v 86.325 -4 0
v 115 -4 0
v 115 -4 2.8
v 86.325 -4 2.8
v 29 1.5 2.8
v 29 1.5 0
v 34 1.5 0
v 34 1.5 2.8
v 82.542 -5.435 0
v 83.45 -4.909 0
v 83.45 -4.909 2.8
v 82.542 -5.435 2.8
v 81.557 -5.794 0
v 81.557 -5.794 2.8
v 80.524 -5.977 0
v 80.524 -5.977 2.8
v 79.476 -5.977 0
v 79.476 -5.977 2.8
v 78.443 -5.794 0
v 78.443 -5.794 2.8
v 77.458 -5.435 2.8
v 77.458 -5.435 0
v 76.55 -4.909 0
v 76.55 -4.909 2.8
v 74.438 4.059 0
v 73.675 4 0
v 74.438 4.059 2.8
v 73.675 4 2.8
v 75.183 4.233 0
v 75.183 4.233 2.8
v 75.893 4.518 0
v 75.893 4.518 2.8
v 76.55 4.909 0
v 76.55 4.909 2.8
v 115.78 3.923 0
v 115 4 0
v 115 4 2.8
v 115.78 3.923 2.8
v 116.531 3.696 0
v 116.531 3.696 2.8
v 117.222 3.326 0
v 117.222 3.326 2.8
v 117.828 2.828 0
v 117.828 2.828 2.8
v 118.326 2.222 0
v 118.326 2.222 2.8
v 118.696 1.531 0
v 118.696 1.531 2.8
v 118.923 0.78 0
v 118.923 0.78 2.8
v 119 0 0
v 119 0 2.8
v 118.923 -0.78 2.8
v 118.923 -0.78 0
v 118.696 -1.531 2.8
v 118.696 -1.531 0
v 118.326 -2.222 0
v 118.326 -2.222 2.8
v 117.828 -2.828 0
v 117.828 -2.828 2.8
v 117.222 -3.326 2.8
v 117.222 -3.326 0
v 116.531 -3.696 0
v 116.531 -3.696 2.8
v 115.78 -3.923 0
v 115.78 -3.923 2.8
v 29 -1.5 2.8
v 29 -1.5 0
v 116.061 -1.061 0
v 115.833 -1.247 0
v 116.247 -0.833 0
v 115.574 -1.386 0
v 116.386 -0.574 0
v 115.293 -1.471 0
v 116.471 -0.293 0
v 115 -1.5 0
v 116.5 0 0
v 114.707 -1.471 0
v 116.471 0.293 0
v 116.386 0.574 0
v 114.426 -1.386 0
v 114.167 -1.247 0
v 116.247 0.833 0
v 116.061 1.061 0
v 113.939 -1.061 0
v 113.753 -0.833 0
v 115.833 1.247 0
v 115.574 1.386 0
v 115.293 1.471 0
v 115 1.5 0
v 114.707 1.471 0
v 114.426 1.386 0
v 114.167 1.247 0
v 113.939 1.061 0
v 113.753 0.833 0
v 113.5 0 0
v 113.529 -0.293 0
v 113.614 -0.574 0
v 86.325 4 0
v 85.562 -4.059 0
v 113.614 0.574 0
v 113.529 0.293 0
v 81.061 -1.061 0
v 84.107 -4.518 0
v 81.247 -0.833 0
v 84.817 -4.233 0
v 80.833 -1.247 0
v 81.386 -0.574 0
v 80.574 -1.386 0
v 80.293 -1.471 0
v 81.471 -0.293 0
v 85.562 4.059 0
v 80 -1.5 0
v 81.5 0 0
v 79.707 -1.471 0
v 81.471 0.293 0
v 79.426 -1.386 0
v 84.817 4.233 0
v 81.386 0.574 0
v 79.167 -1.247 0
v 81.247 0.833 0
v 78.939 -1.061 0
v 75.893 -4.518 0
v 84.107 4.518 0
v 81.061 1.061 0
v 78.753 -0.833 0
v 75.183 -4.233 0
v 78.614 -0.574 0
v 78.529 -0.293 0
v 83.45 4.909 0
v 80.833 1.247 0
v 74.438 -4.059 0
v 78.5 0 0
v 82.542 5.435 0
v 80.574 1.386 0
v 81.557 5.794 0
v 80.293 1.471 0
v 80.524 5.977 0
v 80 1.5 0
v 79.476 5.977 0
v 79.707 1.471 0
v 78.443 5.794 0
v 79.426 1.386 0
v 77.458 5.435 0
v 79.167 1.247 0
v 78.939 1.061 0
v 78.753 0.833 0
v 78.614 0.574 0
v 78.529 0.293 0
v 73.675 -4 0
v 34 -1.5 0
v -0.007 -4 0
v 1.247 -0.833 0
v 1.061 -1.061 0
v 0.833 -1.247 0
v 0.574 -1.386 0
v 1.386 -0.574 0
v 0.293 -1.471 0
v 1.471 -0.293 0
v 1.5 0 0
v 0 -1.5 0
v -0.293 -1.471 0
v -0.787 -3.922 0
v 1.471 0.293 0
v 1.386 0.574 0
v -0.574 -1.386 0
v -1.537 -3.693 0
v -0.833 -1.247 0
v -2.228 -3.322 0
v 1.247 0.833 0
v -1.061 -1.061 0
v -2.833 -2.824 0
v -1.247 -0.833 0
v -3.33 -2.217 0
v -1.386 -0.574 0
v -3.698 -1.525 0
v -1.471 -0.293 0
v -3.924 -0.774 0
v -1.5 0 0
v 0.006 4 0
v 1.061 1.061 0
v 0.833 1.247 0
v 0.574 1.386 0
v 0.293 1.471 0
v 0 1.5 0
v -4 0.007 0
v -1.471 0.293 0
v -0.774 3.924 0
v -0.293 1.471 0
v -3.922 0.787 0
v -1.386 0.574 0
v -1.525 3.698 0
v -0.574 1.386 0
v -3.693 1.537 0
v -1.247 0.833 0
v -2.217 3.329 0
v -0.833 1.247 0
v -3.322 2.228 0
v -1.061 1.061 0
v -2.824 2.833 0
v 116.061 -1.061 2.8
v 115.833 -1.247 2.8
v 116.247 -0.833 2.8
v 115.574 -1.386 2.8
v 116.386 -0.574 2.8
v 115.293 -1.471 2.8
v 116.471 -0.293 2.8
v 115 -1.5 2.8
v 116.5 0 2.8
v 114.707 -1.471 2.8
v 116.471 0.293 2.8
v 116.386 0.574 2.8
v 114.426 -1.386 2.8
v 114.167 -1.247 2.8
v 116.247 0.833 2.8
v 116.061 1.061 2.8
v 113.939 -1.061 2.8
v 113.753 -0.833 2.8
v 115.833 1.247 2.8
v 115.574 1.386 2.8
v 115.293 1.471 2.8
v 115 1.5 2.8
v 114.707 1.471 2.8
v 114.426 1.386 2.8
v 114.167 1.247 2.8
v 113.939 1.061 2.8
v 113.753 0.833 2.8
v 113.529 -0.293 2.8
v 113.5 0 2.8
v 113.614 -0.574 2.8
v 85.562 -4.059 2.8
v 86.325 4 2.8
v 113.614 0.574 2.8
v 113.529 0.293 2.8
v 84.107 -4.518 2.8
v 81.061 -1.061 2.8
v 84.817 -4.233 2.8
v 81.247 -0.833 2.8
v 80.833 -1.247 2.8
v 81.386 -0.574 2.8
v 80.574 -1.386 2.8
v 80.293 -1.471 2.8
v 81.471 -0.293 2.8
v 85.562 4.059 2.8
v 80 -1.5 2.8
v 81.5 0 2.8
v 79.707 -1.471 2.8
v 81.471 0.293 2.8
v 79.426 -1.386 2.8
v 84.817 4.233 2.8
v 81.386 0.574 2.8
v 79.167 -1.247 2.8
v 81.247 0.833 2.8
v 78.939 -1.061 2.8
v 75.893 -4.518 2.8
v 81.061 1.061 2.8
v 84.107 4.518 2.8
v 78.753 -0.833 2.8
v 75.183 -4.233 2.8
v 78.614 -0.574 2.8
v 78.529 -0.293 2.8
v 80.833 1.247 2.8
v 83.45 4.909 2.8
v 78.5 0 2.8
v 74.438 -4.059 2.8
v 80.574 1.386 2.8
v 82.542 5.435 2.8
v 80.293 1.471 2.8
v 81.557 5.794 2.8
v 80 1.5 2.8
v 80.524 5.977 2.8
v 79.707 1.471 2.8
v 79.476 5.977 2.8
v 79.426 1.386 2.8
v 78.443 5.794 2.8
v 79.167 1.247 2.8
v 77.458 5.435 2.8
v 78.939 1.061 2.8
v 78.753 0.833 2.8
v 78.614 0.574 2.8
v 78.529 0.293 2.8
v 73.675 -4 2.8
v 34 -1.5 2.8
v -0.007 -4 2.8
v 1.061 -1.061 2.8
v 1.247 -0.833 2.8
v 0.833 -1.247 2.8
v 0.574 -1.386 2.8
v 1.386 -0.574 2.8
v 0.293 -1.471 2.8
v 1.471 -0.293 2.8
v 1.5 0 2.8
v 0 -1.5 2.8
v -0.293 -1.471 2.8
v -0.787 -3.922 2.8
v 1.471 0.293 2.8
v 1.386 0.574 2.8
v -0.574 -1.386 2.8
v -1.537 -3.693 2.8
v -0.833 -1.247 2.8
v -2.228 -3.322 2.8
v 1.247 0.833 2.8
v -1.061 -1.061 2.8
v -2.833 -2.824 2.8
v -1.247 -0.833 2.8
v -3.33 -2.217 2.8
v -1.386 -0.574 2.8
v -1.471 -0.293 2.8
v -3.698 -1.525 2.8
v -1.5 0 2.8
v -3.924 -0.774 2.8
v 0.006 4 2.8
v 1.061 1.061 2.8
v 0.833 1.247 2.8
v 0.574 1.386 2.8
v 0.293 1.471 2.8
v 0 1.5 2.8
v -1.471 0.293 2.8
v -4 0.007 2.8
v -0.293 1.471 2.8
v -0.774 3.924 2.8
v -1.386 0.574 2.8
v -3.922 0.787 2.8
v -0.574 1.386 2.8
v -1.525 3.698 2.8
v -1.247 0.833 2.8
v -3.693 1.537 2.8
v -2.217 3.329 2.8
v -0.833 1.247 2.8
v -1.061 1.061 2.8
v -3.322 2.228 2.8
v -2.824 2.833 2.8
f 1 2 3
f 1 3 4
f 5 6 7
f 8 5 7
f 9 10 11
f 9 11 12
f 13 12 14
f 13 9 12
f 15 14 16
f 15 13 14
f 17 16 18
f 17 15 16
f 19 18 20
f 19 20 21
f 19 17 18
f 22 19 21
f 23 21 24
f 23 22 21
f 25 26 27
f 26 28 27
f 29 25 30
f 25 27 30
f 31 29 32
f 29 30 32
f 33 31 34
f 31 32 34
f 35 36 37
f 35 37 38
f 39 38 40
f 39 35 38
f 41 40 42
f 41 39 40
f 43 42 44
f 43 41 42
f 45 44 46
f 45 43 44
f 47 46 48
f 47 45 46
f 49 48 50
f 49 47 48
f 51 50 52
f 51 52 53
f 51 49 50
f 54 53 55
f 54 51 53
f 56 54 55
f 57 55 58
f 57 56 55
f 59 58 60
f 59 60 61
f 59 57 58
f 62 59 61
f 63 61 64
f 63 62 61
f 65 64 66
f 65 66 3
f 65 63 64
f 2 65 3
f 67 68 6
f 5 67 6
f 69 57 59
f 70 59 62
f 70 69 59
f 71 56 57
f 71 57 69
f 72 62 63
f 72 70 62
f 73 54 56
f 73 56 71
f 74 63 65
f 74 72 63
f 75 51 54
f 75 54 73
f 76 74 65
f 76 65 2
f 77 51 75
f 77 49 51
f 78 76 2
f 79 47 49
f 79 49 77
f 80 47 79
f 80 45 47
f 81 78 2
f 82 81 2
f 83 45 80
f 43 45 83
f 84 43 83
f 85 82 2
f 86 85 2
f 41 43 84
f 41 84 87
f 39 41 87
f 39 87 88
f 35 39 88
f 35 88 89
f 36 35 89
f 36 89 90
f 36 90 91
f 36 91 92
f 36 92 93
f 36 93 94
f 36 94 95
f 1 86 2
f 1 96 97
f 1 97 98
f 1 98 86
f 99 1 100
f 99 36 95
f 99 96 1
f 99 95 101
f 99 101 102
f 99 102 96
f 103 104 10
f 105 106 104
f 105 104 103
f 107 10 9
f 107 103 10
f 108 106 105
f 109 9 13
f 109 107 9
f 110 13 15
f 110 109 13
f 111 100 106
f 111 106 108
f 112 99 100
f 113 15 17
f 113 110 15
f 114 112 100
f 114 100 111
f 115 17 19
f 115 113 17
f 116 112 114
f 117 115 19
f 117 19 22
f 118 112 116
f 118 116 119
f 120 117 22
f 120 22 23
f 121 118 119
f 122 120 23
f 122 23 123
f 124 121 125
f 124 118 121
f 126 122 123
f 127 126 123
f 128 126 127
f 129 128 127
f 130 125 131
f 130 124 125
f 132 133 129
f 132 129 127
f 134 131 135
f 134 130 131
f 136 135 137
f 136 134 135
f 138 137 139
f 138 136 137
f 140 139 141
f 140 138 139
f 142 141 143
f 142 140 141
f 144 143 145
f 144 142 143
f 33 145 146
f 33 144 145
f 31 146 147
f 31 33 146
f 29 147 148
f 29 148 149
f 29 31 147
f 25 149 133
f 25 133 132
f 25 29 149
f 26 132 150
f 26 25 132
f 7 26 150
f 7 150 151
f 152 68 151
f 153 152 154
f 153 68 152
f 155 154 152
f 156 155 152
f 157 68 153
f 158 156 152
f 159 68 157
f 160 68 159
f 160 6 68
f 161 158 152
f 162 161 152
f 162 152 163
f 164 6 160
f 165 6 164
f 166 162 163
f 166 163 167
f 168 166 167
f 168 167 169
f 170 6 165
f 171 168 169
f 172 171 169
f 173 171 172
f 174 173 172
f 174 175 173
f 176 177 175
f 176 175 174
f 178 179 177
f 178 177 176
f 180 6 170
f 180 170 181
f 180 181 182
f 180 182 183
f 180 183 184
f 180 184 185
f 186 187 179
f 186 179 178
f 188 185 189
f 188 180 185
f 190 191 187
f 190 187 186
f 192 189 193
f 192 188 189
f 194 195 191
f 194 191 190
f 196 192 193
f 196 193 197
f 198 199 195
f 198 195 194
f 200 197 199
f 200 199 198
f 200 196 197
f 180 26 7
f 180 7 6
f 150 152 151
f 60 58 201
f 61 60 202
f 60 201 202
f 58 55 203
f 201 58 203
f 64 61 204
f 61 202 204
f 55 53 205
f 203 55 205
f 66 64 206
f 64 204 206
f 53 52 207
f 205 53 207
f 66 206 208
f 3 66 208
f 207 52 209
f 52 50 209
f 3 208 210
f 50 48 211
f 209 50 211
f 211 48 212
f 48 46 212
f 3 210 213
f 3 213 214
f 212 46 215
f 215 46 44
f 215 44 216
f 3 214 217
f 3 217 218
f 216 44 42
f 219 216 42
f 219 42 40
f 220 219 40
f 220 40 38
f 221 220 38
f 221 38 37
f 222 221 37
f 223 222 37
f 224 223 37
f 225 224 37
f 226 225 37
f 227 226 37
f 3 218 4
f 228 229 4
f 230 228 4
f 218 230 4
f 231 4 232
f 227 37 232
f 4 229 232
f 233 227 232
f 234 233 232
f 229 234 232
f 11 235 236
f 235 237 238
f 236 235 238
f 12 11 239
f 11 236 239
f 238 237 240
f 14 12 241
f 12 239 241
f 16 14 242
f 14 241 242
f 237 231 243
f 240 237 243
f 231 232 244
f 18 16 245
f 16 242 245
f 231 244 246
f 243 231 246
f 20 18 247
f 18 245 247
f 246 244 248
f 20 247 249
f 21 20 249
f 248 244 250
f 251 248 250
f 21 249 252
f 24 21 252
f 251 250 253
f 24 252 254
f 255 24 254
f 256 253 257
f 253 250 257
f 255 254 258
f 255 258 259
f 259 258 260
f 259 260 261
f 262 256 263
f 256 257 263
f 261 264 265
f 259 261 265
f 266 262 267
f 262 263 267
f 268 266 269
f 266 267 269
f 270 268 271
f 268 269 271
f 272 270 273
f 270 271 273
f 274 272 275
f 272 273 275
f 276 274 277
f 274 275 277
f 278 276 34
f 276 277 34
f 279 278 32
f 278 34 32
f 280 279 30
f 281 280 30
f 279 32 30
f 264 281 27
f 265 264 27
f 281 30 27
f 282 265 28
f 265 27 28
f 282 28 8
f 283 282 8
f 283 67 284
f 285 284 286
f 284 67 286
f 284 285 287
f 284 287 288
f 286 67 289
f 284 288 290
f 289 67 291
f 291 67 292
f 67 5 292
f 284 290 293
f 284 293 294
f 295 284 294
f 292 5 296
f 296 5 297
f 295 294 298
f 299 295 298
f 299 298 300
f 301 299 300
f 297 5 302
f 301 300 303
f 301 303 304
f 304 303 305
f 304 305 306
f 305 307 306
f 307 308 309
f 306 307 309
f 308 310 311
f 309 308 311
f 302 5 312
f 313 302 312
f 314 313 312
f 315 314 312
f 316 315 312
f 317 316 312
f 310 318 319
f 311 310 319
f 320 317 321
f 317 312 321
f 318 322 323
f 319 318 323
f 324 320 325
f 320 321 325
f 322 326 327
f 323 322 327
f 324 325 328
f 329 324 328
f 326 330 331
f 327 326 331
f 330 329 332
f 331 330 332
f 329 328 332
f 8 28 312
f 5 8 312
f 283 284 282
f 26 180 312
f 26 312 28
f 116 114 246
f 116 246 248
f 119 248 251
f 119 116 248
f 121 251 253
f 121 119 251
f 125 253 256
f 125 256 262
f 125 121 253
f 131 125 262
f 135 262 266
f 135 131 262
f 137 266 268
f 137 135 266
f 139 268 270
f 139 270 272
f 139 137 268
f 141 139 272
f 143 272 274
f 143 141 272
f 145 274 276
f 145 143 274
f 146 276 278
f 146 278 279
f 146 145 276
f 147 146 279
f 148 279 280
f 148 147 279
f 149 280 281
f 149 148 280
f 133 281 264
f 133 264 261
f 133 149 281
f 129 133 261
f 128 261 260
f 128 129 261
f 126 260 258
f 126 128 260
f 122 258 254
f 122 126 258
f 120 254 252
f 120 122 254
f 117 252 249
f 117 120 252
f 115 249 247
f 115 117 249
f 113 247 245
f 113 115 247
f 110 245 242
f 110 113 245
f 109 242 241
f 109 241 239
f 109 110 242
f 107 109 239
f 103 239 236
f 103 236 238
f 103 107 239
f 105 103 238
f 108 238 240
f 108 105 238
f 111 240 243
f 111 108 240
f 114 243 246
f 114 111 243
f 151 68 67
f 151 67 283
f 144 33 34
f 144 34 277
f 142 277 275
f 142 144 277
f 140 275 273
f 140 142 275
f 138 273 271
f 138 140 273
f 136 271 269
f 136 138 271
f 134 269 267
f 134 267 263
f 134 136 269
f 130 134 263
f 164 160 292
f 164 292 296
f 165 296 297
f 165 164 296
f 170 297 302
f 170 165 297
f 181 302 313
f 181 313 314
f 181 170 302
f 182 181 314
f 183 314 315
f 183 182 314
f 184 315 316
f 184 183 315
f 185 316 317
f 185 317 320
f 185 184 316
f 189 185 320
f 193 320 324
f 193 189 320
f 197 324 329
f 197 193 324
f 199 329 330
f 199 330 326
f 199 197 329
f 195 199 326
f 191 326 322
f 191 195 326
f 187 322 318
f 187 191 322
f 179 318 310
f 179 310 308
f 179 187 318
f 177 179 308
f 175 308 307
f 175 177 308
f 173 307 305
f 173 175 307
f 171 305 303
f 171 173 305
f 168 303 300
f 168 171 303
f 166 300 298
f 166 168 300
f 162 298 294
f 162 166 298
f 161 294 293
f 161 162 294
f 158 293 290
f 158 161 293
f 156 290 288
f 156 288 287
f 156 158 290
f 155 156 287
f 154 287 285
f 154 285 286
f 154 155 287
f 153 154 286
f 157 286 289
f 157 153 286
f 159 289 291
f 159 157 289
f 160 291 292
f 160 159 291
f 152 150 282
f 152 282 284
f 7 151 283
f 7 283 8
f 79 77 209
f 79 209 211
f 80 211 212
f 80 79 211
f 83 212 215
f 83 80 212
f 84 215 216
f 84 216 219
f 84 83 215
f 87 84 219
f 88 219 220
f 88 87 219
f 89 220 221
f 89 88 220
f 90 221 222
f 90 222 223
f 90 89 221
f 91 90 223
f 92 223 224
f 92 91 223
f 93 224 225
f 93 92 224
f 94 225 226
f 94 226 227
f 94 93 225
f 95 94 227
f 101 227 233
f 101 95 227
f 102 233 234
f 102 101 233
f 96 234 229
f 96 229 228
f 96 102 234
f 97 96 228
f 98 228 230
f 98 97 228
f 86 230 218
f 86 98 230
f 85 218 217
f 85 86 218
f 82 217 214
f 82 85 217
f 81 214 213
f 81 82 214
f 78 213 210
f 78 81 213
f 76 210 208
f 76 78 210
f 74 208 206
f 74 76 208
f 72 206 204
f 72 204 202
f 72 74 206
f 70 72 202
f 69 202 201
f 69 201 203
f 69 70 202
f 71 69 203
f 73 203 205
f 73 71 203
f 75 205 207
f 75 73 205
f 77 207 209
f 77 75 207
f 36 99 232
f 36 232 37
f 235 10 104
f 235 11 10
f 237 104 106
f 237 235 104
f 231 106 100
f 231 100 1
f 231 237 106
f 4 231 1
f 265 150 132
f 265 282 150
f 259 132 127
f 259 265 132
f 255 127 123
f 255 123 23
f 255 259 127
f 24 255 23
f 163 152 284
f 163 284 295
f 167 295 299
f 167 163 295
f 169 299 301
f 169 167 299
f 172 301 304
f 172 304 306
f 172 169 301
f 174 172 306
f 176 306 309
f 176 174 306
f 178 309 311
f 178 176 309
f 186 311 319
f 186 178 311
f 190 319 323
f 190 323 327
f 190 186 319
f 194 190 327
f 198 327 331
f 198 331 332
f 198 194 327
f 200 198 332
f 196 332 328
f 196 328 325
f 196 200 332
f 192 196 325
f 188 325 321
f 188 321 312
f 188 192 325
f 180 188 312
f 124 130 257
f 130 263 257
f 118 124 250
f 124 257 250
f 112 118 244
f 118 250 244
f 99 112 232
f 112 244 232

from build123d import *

# Parameters (mm, degrees)
SKETCH1_R           = 1.5
SKETCH1_W           = 5
SKETCH1_H           = 3
BOSS_EXTRUDE1_DEPTH = 2.8
FILLET1_R           = 5


with BuildPart() as part:
    # Sketch1 → Boss-Extrude1 (new body)
    with BuildSketch(Plane.XY):
        with BuildLine():
            Line((0.006174378, 4.000000753), (75.527864276, 4.000000258))
            ThreePointArc((75.527864276, 4.000000258), (80.000000039, 6), (84.472135776, 4.0000002))
            Line((84.472135776, 4.0000002), (115.000000079, 4))
            ThreePointArc((115.000000079, 4), (119, -5.2e-08), (114.999999974, -4))
            Line((114.999999974, -4), (84.472136134, -3.9999998))
            ThreePointArc((84.472136134, -3.9999998), (79.999999961, -6), (75.527863814, -3.999999742))
            Line((75.527863814, -3.999999742), (-0.007082675, -3.999999247))
            ThreePointArc((-0.007082675, -3.999999247), (-4.000000026, 0.006628527), (0.006174378, 4.000000753))
        make_face()
        with Locations((80, 0)):
            Circle(SKETCH1_R, mode=Mode.SUBTRACT)
        with Locations((115, 0)):
            Circle(SKETCH1_R, mode=Mode.SUBTRACT)
        Circle(SKETCH1_R, mode=Mode.SUBTRACT)
        with Locations((31.499999974, 0)):
            Rectangle(SKETCH1_W, SKETCH1_H, mode=Mode.SUBTRACT)
    extrude(amount=BOSS_EXTRUDE1_DEPTH)

    # Fillet1
    fillet1_edges = [part.edges().sort_by_distance(p)[0] for p in [
        (75.527864276, 4.000000258, 1.4),
        (84.472135776, 4.0000002, 1.4),
        (84.472136134, -3.9999998, 1.4),
        (75.527863814, -3.999999742, 1.4),
    ]]
    fillet(fillet1_edges, radius=FILLET1_R)


solid = part.part
